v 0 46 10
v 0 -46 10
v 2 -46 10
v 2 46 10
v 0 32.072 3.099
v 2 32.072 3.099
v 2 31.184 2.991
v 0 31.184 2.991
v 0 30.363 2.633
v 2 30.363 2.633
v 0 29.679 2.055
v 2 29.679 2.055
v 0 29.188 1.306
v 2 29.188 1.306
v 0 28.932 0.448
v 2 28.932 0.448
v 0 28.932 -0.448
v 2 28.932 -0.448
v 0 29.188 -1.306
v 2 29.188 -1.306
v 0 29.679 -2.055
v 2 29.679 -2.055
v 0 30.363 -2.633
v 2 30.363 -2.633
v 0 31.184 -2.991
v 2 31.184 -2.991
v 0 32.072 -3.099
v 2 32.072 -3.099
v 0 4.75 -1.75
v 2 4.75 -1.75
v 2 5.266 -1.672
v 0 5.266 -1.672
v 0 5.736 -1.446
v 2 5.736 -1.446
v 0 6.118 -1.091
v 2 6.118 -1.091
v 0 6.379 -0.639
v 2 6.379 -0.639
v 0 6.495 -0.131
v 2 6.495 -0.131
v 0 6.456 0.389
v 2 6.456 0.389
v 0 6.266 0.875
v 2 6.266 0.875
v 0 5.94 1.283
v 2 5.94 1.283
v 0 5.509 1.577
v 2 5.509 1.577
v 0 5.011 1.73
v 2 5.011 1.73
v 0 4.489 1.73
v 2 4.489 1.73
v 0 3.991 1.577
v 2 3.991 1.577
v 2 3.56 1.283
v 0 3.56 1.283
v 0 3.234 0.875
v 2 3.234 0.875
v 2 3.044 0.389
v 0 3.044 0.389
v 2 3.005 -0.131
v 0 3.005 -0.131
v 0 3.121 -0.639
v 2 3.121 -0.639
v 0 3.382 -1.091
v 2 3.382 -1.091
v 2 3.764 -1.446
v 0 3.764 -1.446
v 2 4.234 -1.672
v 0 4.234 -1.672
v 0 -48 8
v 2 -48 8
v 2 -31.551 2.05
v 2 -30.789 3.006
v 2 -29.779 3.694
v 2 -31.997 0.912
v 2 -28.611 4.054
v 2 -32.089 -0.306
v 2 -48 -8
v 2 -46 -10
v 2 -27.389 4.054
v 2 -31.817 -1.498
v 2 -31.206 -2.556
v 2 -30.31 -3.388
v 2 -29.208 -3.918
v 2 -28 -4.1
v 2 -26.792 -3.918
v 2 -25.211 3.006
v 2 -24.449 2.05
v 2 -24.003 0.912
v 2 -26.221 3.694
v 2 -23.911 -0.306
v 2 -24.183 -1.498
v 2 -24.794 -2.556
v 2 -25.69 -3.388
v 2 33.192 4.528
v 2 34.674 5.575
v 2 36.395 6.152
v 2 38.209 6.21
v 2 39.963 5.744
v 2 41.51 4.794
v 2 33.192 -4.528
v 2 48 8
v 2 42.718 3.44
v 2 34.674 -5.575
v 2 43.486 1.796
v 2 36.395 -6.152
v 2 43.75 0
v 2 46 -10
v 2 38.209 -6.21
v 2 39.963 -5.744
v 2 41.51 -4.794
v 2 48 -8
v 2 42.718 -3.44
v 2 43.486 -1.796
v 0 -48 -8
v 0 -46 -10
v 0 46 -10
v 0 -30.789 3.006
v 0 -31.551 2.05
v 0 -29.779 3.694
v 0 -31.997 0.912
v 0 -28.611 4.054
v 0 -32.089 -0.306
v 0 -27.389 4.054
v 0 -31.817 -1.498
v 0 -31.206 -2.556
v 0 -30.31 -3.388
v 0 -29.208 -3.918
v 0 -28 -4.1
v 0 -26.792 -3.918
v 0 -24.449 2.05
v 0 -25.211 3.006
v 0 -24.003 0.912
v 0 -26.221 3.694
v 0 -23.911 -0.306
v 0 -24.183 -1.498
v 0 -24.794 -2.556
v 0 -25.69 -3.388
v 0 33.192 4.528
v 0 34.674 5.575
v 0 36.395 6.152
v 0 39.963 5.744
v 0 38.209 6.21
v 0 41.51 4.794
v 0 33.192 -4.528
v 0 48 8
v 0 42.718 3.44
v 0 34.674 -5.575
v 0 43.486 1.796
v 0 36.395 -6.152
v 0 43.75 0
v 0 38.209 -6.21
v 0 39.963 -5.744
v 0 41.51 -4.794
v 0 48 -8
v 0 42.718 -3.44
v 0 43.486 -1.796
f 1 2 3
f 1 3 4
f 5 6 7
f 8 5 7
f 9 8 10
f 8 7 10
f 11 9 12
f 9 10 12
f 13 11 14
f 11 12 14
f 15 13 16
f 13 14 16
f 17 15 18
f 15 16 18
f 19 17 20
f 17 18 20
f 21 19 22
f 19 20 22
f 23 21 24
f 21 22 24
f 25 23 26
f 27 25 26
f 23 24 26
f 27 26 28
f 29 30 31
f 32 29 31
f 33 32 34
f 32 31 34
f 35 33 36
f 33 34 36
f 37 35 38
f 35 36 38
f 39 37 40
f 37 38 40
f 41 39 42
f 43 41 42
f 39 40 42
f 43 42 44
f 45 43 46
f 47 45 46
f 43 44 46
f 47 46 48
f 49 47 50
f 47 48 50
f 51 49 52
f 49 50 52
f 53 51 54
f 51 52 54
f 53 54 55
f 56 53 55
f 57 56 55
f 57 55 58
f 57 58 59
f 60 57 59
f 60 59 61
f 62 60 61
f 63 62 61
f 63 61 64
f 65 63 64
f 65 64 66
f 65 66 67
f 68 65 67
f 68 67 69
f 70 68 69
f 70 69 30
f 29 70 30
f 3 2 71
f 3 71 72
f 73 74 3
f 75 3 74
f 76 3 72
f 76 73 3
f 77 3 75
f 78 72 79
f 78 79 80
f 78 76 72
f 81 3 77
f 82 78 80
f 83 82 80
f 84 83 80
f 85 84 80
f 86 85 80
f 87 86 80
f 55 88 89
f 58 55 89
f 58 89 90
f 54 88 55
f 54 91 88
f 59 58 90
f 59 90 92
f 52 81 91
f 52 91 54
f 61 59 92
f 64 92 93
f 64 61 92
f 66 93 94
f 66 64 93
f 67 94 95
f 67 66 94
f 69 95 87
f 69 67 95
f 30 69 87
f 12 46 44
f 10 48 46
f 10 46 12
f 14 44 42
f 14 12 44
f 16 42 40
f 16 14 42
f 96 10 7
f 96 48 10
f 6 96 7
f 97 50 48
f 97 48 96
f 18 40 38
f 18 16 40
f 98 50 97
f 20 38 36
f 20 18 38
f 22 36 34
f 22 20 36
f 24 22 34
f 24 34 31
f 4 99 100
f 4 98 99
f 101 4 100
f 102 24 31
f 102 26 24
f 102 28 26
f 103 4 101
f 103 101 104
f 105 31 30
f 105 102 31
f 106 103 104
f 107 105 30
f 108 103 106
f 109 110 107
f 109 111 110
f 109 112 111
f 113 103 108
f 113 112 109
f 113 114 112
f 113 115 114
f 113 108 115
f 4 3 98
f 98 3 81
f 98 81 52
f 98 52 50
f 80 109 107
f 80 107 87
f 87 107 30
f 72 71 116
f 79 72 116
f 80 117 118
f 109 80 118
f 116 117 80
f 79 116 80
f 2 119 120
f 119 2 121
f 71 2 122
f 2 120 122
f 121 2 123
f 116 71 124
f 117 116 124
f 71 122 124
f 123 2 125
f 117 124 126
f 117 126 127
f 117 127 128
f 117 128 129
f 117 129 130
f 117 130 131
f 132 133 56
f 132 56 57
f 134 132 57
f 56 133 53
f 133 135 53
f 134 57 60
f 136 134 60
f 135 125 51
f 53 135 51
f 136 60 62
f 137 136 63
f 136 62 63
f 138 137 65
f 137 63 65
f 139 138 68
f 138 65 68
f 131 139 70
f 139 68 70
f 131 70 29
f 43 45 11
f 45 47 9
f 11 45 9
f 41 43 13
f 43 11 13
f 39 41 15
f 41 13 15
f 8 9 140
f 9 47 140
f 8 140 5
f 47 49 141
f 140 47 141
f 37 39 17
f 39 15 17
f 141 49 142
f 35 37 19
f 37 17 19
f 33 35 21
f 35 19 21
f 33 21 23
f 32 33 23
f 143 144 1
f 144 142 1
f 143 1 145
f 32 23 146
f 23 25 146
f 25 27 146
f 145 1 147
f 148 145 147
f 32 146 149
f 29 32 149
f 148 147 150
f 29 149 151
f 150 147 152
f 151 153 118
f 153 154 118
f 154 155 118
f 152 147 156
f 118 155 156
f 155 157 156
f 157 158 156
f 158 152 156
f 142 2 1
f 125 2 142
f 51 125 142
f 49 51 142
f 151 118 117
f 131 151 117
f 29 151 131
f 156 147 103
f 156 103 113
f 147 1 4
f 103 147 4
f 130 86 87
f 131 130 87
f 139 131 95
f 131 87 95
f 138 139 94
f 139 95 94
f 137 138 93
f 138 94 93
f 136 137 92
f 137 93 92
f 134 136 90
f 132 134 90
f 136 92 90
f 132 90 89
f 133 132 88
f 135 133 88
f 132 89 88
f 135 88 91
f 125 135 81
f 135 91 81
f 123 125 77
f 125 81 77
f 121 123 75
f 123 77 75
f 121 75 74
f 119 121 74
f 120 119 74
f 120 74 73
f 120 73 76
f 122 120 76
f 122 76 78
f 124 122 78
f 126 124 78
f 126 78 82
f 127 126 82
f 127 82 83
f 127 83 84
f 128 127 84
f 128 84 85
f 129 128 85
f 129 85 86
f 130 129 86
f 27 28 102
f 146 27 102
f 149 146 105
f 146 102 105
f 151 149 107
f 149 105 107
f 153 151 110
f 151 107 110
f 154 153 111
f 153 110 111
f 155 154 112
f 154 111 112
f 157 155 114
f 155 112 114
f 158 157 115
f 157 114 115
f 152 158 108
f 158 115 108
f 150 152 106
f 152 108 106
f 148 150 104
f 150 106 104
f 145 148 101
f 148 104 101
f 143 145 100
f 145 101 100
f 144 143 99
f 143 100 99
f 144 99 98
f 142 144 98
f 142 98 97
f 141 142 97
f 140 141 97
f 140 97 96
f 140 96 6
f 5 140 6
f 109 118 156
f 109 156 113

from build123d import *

# Parameters (mm, degrees)
SKETCH1_W           = 20
SKETCH1_H           = 96
BOSS_EXTRUDE2_DEPTH = 2
SKETCH3_R           = 1.75
SKETCH3_R_2         = 4.1
CUT_EXTRUDE1_DEPTH  = 50.071376586
CHAMFER1_SIZE       = 2


with BuildPart() as part:
    # Sketch1 → Boss-Extrude2 (new body)
    with BuildSketch(Plane(origin=(0, 0, 0), x_dir=(0, 0, -1), z_dir=(1, 0, 0))):
        Rectangle(SKETCH1_W, SKETCH1_H)
    extrude(amount=BOSS_EXTRUDE2_DEPTH)

    # Sketch3 → Cut-Extrude1 (cut, through all)
    with BuildSketch(Plane(origin=(2, 0, 0), x_dir=(0, 0, -1), z_dir=(1, 0, 0))):
        with Locations((0, 4.75)):
            Circle(SKETCH3_R)
        with Locations((0, -28)):
            Circle(SKETCH3_R_2)
        with BuildLine():
            ThreePointArc((3.099152102, 32.0725), (0, 43.75), (-3.099152102, 32.0725))
            ThreePointArc((-3.099152102, 32.0725), (0, 28.9), (3.099152102, 32.0725))
        make_face()
    extrude(amount=-CUT_EXTRUDE1_DEPTH, mode=Mode.SUBTRACT)

    # Chamfer1
    chamfer1_edges = [part.edges().sort_by_distance(p)[0] for p in [
        (1, -48, -10),
        (1, -48, 10),
        (1, 48, 10),
        (1, 48, -10),
    ]]
    chamfer(chamfer1_edges, length=CHAMFER1_SIZE)


solid = part.part
